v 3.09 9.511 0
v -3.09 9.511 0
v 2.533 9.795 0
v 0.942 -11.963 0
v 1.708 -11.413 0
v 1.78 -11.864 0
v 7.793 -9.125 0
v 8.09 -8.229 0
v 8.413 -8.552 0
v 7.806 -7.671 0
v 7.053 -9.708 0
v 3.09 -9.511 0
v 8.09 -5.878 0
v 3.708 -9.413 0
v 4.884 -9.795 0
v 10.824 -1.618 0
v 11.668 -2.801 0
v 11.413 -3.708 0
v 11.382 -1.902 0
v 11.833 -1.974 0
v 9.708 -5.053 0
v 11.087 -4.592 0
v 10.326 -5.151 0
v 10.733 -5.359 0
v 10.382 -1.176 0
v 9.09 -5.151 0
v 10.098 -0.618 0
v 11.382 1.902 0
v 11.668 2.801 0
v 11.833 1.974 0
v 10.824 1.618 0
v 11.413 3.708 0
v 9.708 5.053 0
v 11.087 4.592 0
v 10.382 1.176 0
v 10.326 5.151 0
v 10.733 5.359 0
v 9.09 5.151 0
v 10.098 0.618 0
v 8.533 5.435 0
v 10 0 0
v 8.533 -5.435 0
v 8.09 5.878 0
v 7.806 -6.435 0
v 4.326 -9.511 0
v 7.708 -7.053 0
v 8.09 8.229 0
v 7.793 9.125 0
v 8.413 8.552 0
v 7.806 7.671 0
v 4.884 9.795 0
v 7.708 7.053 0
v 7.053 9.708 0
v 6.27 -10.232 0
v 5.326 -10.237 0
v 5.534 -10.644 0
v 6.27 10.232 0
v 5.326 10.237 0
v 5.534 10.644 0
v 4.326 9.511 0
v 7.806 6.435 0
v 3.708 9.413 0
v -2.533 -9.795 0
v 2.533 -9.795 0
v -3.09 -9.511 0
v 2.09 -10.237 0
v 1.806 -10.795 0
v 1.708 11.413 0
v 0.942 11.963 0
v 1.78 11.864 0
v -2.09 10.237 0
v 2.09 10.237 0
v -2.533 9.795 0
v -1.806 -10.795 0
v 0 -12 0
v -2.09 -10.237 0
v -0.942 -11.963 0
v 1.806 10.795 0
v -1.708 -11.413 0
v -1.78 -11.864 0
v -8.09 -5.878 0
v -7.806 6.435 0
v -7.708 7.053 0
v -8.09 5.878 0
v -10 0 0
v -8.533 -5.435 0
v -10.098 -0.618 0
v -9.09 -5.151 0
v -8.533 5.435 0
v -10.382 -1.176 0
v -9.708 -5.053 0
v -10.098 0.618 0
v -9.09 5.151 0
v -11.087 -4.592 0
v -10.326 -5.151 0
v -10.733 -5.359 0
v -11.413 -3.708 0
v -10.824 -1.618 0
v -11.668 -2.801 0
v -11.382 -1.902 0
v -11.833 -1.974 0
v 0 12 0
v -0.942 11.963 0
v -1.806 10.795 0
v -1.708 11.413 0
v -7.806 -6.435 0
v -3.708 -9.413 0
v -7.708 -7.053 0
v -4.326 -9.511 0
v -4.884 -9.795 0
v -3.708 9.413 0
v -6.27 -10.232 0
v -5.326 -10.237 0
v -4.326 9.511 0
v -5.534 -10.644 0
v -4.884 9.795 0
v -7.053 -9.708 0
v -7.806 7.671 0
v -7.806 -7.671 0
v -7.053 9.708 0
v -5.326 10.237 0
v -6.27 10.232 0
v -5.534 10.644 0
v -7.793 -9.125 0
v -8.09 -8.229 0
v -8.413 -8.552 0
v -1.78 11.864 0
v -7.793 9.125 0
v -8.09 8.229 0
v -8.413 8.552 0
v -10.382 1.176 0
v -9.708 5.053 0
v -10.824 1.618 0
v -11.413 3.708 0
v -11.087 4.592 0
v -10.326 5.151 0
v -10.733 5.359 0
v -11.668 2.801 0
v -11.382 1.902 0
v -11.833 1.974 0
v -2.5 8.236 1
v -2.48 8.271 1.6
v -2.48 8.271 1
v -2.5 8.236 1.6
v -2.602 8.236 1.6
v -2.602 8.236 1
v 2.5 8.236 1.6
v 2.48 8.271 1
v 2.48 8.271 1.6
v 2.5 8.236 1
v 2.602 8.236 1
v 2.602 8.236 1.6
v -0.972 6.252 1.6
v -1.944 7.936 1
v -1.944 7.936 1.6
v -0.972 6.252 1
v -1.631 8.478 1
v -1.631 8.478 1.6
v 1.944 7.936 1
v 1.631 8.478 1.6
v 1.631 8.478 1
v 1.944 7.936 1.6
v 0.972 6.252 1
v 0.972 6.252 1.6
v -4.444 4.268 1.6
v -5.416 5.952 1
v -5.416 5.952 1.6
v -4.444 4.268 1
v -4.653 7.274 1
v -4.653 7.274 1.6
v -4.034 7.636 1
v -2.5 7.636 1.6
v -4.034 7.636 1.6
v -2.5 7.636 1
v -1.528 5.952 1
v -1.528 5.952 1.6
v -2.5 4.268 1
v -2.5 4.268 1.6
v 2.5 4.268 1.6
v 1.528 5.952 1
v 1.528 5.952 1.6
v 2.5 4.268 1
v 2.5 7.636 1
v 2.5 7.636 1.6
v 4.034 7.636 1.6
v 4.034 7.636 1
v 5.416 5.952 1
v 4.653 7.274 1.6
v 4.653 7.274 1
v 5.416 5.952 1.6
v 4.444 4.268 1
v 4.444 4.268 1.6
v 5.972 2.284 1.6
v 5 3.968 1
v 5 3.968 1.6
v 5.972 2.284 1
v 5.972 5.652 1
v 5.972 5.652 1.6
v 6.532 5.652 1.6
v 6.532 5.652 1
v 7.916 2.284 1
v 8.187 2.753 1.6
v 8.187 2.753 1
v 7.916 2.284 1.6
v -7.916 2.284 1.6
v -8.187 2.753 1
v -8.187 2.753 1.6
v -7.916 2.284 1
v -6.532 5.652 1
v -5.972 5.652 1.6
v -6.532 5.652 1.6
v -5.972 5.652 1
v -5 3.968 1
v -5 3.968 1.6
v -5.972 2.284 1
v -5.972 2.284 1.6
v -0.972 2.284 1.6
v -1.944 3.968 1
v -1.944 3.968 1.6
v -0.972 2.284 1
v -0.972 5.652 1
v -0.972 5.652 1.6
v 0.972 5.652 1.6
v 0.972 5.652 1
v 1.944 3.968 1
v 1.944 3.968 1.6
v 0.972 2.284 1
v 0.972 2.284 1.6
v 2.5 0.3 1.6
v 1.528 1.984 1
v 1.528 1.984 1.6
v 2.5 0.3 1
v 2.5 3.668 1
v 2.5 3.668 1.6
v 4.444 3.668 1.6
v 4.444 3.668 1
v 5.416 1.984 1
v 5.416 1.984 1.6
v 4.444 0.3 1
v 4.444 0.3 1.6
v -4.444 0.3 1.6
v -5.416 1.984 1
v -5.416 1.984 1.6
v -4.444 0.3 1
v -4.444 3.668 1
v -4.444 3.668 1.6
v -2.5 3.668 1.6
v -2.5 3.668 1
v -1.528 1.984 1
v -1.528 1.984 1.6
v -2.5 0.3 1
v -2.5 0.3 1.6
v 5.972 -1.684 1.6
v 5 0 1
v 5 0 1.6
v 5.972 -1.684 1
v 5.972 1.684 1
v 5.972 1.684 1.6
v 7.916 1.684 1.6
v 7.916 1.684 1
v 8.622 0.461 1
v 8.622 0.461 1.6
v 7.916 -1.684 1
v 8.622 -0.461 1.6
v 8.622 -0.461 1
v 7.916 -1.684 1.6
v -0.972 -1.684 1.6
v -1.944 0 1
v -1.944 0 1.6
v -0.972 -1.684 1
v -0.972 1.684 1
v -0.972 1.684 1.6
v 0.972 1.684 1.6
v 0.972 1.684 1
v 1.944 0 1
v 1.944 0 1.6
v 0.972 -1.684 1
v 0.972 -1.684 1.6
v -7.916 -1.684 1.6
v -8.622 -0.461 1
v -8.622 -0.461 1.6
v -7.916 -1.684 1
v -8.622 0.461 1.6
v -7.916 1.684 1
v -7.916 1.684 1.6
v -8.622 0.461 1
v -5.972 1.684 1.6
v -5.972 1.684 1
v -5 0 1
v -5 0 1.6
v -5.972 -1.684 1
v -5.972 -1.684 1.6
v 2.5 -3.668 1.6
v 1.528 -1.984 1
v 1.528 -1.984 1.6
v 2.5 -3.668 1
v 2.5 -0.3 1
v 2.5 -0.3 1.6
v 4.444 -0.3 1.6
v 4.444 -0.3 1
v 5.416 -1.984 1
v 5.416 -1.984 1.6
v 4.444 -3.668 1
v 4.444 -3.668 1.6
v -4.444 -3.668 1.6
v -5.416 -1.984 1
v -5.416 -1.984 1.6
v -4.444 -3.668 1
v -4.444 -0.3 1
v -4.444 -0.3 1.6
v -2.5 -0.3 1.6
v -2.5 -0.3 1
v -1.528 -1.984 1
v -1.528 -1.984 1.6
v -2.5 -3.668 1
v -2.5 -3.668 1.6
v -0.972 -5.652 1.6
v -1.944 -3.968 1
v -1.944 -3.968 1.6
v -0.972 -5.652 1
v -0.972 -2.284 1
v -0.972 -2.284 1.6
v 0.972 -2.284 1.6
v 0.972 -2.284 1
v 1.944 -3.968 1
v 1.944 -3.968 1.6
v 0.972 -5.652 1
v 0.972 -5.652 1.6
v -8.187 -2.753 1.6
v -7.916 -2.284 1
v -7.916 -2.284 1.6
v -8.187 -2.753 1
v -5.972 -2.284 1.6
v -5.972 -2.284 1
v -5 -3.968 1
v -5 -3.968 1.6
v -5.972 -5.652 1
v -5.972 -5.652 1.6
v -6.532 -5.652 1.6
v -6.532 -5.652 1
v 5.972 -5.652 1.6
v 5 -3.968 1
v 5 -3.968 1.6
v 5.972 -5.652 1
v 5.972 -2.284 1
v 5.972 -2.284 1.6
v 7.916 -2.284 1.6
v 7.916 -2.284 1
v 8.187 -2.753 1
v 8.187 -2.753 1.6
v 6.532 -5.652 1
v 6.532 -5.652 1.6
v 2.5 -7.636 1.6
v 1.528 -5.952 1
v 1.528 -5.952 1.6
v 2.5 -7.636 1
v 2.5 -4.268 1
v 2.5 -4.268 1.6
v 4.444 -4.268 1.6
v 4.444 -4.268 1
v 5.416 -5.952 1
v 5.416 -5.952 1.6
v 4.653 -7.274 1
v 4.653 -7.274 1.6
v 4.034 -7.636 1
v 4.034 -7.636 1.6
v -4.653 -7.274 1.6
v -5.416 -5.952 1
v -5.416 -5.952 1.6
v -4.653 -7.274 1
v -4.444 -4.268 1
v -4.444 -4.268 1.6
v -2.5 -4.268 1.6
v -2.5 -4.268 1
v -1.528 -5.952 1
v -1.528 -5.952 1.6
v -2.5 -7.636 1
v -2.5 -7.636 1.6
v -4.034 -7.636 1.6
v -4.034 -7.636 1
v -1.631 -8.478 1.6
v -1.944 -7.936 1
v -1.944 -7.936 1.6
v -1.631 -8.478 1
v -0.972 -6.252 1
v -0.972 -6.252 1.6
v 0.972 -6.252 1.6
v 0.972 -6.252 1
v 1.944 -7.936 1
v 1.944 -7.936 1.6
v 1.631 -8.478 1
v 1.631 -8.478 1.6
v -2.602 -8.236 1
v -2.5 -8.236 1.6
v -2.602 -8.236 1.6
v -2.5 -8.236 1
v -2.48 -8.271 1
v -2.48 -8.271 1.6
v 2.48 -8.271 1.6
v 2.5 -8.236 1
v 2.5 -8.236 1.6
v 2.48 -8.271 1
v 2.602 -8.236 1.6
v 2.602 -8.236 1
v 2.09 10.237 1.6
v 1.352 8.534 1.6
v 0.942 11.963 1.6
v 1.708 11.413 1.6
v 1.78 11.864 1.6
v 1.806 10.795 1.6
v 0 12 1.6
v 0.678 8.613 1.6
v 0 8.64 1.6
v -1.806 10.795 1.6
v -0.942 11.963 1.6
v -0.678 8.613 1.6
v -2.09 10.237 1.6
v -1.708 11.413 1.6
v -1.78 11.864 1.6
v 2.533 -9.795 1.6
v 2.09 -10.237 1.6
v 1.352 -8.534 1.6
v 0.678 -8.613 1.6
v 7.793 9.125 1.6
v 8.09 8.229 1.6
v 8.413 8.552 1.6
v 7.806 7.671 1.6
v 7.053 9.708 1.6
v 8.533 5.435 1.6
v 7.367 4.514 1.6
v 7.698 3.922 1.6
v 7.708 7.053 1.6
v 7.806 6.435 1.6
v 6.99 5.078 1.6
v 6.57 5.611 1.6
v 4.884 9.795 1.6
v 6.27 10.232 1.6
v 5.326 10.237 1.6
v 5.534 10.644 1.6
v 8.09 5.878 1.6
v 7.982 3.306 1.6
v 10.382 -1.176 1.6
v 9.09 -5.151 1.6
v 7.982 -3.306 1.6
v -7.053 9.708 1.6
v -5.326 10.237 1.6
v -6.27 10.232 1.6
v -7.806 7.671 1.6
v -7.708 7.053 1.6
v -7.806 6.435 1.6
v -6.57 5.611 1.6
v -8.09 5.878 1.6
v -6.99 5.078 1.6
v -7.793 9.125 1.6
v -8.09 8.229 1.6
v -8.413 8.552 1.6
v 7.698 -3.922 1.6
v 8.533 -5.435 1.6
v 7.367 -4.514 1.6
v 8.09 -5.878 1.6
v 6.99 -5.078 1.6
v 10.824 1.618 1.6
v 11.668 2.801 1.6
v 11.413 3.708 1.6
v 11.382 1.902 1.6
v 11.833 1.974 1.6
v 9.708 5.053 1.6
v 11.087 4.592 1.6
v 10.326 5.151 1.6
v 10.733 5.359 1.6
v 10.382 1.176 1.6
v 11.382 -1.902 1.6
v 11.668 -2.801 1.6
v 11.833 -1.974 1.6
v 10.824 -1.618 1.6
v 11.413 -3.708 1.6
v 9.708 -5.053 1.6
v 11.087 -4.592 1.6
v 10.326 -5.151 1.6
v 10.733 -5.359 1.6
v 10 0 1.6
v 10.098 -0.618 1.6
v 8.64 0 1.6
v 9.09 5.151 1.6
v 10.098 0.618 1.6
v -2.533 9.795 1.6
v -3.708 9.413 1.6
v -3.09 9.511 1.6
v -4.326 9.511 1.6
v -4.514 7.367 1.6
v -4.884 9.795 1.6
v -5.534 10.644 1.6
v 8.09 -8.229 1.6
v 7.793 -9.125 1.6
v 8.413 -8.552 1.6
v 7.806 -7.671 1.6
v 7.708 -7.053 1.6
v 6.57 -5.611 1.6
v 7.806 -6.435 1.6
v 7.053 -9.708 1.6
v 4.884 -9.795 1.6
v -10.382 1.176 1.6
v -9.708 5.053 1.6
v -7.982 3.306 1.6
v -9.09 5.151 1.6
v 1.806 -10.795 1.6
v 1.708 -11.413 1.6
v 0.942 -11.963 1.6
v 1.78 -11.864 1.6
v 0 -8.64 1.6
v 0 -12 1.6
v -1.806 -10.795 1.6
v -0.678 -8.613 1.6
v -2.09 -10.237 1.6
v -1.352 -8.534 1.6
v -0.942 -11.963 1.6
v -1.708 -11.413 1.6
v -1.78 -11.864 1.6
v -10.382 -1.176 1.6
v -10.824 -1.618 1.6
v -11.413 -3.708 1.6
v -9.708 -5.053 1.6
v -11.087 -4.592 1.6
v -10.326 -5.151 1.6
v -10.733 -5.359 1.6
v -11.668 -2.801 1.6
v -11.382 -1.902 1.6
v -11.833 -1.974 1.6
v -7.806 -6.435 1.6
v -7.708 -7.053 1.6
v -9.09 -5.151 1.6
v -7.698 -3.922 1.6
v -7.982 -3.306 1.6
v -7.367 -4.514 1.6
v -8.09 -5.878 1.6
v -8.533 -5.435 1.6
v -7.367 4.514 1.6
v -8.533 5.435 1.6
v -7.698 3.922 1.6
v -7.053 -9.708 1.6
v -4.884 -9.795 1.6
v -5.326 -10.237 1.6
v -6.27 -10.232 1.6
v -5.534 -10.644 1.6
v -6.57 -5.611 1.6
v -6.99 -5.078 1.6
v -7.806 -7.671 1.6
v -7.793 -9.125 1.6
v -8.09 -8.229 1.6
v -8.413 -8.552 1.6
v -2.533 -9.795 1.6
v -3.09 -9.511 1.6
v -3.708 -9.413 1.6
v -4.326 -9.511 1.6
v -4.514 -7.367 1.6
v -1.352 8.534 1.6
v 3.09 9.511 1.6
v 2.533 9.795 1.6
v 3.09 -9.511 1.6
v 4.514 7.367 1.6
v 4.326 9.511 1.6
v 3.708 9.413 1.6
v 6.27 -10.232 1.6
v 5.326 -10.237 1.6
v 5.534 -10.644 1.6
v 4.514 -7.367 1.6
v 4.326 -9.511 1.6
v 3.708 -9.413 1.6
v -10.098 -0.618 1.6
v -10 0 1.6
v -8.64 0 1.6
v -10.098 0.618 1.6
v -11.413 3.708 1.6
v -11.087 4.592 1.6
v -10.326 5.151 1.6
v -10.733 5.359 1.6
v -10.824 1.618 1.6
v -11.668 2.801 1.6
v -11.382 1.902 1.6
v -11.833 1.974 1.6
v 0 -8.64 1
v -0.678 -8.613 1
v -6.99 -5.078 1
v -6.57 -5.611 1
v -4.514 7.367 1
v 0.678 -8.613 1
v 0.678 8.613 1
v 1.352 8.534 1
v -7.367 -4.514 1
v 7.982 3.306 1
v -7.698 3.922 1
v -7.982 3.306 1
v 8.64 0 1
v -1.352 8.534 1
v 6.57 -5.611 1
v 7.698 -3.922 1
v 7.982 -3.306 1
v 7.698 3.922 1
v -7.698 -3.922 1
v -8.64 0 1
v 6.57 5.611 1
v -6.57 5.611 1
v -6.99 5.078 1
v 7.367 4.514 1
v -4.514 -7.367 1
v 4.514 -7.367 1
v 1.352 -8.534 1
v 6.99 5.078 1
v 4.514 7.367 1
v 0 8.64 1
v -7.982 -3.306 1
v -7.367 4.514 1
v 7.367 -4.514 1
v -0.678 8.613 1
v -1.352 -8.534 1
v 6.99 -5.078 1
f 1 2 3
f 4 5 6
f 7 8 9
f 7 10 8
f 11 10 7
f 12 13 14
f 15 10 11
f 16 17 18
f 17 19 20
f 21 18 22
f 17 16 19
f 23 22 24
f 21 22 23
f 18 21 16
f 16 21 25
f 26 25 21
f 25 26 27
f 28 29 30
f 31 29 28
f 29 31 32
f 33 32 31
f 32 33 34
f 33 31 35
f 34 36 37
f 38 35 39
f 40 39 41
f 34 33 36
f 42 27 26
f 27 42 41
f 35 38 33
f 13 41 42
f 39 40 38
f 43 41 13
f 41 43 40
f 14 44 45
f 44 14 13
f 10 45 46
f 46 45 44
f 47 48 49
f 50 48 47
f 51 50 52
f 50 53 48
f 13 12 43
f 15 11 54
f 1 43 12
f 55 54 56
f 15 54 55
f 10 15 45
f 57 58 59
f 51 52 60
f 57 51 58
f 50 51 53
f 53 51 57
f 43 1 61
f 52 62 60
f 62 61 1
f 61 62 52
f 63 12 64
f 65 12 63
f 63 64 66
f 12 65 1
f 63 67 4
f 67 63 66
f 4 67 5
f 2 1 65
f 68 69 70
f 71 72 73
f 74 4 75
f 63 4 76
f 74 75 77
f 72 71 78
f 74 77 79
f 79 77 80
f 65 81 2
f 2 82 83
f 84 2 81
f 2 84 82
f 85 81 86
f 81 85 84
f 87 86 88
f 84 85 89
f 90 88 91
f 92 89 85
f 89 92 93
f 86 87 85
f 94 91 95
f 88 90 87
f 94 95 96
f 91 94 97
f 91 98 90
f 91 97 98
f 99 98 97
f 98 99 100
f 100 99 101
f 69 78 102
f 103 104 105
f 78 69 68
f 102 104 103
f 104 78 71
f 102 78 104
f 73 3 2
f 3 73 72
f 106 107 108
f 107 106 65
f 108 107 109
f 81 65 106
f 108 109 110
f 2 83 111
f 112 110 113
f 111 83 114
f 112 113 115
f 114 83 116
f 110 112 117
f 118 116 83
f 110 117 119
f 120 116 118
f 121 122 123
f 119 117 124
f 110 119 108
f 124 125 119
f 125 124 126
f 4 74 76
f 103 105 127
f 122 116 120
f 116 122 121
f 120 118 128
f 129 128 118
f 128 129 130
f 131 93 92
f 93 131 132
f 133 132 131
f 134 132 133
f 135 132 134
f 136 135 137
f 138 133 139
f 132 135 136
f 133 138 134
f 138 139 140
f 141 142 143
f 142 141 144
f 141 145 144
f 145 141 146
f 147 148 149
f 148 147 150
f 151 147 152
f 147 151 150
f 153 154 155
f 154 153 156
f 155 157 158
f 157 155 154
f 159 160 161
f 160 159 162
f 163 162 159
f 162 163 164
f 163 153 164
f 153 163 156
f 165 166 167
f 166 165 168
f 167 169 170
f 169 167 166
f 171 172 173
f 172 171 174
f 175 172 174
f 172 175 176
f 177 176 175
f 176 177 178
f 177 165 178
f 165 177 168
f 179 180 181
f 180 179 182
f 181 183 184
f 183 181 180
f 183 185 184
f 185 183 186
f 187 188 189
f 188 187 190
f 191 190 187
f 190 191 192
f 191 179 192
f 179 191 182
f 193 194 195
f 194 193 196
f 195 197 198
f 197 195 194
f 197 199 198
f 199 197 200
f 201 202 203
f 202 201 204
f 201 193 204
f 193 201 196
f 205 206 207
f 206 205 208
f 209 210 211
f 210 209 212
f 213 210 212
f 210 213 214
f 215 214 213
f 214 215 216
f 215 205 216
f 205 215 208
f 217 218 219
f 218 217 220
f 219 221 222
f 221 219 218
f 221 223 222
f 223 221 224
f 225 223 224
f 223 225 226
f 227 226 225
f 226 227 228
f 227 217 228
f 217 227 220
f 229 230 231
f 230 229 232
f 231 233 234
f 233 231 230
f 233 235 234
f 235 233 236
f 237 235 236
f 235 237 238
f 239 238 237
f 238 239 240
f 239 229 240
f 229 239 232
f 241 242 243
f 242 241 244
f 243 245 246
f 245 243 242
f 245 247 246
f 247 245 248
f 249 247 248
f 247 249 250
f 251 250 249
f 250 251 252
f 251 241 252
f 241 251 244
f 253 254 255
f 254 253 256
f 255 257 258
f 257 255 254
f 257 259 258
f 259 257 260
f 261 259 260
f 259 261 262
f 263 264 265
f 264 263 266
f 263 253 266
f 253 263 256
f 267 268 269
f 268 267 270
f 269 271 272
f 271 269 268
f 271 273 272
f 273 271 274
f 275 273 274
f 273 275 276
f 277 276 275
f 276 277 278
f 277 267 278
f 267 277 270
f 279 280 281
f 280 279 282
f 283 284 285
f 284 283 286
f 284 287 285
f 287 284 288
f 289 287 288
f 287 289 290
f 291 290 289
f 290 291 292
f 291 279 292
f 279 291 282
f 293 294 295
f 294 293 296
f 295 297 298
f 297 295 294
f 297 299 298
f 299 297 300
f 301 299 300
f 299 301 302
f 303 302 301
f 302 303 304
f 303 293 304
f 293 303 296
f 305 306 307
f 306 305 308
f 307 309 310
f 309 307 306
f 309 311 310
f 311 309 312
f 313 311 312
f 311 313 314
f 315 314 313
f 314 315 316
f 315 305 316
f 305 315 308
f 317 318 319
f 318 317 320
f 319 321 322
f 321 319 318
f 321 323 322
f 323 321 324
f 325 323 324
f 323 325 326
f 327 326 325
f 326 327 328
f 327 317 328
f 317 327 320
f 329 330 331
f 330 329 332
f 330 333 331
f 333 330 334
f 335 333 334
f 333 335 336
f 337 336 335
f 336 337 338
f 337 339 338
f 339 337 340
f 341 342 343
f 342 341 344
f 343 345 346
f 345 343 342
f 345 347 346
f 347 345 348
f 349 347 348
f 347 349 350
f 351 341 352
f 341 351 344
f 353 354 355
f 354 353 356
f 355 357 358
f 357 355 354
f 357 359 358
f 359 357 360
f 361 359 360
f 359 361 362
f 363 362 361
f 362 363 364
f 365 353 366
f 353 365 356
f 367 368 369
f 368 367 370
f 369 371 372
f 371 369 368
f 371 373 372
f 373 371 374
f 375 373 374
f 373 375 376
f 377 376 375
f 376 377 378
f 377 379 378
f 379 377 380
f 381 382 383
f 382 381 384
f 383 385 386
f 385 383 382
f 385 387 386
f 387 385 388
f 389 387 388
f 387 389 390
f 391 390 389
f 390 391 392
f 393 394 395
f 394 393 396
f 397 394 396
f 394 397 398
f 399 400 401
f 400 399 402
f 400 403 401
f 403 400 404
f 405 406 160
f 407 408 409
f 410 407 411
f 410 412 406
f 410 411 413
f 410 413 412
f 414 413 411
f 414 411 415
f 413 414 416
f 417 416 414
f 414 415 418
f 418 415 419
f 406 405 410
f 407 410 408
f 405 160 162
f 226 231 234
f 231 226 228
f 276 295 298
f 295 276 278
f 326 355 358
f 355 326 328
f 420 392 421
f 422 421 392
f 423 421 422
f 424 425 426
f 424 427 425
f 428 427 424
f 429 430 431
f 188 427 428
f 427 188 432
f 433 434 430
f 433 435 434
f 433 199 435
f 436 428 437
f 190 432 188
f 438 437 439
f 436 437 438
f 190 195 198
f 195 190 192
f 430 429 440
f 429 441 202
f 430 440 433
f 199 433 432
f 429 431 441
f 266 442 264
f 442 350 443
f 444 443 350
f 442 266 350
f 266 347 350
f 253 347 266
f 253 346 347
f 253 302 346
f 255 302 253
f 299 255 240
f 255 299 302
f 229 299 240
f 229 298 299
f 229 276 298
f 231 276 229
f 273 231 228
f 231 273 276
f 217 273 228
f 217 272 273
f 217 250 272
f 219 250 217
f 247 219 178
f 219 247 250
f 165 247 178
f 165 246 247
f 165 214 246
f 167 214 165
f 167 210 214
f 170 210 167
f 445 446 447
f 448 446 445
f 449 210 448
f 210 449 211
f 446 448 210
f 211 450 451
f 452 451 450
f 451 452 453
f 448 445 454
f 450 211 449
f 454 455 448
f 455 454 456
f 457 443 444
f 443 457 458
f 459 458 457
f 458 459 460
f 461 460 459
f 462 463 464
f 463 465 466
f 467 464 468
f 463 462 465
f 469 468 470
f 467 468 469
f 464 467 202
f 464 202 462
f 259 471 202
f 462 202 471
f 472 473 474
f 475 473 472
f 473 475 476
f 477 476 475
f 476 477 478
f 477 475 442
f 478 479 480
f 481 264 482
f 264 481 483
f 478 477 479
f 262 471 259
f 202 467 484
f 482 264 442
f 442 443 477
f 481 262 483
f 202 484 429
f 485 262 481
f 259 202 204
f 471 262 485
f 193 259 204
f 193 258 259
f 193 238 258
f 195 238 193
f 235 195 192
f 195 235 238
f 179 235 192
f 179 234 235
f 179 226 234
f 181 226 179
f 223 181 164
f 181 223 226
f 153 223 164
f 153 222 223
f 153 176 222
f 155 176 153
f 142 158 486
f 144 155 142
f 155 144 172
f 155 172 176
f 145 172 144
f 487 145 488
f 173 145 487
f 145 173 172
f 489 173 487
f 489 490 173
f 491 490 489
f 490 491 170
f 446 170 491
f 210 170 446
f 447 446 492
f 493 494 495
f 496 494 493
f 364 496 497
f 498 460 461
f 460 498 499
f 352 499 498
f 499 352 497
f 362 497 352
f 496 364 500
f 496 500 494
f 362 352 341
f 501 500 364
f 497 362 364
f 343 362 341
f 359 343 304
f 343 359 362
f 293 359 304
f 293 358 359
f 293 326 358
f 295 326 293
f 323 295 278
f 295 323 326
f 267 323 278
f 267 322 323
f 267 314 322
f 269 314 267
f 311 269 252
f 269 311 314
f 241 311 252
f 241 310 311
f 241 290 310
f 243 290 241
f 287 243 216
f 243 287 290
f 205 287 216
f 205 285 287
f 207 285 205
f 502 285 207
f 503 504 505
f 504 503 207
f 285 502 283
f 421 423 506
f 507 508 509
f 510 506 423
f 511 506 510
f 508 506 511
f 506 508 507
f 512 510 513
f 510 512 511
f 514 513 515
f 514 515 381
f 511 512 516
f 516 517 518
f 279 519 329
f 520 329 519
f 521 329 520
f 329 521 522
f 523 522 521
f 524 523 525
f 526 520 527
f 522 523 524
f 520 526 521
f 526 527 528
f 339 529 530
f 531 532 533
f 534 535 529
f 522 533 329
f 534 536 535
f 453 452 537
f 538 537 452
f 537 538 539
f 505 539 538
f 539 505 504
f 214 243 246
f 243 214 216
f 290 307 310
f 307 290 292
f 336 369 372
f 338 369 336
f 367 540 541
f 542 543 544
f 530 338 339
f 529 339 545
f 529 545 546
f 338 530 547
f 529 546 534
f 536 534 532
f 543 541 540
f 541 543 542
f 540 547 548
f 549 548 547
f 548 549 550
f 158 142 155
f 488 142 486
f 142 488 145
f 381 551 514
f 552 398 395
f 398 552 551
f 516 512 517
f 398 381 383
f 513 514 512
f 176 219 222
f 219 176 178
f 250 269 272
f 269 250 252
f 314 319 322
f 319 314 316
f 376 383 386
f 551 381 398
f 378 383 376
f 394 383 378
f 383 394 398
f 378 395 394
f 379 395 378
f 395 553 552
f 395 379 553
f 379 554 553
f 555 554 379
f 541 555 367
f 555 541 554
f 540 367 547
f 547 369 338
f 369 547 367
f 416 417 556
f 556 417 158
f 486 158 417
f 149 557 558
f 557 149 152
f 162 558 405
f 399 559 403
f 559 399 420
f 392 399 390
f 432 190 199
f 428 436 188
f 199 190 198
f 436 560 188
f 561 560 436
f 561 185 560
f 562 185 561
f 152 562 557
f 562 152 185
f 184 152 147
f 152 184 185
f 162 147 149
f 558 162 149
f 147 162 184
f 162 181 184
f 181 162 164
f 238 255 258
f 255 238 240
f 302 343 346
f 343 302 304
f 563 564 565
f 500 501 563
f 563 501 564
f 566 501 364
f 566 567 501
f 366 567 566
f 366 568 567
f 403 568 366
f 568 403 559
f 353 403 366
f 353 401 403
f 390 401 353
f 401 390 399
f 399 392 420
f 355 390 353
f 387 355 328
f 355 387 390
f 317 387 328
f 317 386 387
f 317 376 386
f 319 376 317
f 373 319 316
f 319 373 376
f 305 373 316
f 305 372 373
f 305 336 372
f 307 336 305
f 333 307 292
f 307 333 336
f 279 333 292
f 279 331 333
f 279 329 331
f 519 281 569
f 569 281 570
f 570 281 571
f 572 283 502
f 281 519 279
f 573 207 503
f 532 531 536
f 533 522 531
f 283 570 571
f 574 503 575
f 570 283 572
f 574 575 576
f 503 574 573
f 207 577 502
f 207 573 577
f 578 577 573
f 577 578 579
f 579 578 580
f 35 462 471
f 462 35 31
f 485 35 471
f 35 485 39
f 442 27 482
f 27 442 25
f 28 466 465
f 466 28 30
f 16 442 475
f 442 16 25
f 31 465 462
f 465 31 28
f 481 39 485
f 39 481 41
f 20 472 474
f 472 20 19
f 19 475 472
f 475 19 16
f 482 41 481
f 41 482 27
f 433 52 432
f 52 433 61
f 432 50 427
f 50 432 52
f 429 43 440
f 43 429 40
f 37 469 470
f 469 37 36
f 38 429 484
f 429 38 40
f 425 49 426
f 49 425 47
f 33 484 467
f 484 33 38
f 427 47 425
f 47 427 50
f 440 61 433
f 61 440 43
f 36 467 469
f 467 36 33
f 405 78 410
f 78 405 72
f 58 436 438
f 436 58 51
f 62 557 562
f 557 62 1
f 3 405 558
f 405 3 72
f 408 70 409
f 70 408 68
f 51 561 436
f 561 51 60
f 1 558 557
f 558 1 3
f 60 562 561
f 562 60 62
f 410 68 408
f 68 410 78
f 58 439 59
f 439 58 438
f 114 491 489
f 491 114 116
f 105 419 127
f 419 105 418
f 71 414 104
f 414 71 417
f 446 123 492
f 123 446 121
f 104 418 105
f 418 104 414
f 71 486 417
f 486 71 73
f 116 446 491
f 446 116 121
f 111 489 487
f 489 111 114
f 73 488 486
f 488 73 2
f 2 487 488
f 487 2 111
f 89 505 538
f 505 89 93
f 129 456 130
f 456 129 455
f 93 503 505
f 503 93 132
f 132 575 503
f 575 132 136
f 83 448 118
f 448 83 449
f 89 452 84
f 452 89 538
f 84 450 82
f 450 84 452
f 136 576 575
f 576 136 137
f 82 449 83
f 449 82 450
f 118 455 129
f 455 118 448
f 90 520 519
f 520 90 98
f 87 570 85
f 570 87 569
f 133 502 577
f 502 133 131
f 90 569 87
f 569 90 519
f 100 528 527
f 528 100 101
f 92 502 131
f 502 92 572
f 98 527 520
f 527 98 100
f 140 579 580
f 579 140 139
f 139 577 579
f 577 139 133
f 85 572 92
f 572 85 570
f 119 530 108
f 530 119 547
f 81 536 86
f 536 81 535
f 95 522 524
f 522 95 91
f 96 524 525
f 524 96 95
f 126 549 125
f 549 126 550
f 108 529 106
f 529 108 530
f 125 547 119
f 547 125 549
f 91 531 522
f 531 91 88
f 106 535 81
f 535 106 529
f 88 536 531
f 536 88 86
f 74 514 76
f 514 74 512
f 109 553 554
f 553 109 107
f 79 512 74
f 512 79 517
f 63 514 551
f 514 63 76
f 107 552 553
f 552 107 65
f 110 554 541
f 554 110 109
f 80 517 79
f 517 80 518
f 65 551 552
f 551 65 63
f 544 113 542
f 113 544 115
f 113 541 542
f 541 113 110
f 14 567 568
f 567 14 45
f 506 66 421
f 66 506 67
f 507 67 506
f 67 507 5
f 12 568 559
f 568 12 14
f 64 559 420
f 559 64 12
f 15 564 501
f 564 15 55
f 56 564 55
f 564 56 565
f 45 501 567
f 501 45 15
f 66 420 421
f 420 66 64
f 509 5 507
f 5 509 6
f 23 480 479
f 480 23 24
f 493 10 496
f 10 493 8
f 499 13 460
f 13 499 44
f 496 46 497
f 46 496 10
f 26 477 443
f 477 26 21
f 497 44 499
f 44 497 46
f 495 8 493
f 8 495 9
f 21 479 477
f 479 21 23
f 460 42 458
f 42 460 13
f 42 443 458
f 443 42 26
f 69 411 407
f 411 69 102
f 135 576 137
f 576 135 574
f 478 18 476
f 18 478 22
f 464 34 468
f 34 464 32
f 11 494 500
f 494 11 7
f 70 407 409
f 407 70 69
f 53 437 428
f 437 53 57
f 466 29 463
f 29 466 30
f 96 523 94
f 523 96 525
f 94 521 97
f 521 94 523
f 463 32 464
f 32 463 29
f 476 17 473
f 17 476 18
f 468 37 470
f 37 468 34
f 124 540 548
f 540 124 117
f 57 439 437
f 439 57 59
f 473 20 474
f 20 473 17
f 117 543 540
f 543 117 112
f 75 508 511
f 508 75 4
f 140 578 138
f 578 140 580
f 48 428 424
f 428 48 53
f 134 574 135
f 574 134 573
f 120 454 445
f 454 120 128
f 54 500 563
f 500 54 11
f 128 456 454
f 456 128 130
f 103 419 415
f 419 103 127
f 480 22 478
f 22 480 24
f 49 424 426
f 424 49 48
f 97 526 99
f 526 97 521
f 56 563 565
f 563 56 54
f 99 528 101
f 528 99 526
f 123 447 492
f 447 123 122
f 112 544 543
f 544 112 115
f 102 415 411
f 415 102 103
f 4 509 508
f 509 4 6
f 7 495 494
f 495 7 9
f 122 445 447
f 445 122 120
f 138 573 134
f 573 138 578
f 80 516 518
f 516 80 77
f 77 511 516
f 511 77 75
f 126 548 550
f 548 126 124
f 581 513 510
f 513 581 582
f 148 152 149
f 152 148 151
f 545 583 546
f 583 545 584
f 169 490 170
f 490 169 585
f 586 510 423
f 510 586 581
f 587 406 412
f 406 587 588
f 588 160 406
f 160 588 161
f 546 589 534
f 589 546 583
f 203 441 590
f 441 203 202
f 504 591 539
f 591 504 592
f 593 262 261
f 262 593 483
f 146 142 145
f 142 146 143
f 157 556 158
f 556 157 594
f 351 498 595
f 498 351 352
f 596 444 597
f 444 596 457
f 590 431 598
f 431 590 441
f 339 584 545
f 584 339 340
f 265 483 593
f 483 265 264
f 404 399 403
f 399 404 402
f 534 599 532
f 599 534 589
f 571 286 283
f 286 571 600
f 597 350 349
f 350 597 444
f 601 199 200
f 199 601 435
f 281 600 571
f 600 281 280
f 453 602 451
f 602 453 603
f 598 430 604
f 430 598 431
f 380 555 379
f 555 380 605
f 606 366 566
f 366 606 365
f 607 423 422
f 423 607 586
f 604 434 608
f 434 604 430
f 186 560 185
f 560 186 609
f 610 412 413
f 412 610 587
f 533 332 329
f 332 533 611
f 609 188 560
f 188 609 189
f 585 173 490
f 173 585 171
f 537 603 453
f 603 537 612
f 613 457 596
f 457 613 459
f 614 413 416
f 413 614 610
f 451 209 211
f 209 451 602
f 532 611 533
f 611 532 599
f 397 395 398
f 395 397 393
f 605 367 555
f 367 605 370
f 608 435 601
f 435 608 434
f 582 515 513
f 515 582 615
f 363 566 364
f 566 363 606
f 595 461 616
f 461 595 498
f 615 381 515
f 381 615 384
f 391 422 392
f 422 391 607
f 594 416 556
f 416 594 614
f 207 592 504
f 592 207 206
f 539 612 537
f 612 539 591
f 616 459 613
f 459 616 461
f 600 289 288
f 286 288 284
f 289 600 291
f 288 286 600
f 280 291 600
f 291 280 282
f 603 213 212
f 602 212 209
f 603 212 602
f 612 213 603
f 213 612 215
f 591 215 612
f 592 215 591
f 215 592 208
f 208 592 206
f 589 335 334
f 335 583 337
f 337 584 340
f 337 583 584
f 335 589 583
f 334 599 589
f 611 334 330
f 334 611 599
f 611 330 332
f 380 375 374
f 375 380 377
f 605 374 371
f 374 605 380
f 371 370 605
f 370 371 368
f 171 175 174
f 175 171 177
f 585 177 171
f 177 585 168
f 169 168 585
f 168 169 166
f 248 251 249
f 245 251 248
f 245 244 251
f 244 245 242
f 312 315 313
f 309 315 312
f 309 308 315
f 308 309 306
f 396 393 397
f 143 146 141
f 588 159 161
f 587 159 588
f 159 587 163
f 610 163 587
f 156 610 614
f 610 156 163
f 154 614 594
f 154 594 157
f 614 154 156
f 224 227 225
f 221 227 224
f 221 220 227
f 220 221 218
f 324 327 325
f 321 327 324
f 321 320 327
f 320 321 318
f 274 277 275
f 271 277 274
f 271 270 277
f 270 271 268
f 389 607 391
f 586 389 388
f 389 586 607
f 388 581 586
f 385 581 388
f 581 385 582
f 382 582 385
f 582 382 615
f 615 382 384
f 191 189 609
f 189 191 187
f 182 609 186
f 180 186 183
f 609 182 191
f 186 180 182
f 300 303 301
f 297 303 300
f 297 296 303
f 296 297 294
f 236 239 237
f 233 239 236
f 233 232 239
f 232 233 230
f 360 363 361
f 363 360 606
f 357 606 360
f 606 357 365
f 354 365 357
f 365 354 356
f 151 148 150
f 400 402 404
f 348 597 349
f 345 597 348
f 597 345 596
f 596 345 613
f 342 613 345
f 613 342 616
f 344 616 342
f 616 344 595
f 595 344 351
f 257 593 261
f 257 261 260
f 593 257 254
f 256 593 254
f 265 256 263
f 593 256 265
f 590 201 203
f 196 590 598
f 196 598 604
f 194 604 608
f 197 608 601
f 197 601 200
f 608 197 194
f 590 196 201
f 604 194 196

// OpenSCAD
// file: hexagonal_grid.scad
// See https://gist.github.com/lorennorman/1534990

module hexagon(radius)
{
  circle(r=radius,$fn=6);
}
 
module shell(radius)
{
  difference()
  {
    hexagon(radius*1.2); // base
    scale([1, 1, 1.1]) hexagon(radius*0.98); // hole, rad was * 0.85
  }
}
 
module piece(radius)
{
  translate([0, 0, -radius/12])
  {
    scale([1,1,0.5])
    {
      hexagon(radius);
    }
  }
}
 
module shell_with_piece(radius)
{
  shell(radius);
  piece(radius);
}
 
function column_to_offset(column, offset) = (column % 2) * offset;
 
module translate_to_hex(x_coord, y_coord, hex_width)
{
  translate([x_coord*hex_width*1.75, y_coord*hex_width*2+column_to_offset(x_coord, hex_width), 0])
  {
    children(0);
  }
}
 
module lattice(rows, columns, hex_width)
{
  for(x = [0:columns-1])
  {
    for(y = [0:rows-1])
    {
      translate_to_hex(x, y, hex_width)
      {
        shell(hex_width);
      }
    }
  }
}
 
linear_extrude(height=4)
{
  lattice(4, 5, 8);
 
  // translate_to_hex(2, 2, 4)
  // {
  //   piece(4);
  // }
}
// main file
// Modified to simplify design somewhat (removed domed top) -- RBR 2/5/2015

use <hexagonal_grid.scad>;

hexWidth = 2.0; // mm

module shield() {

union() scale([0.8, 0.8, 0.4]) {

	intersection() {
		union() {
			scale(1.24) translate([-14, -20, 0]) {
				linear_extrude(height = 20)
				   lattice(10, 10, hexWidth);
			}
		}
		translate([0, 0, -1]) cylinder(r = 12, h = 5);
		// translate([0, 0, -1]) cylinder(r = 12, h = 50);
		// translate([0, 0, 1.5]) scale([1, 1, 0.35]) sphere(11);
	}

	difference() {
		cylinder(h = 4, r = 15, $fn = 80);
		translate([0, 0, -0.5]) cylinder(h = 5, r = 10.8, $fn = 80);
		//translate([0, 0, -0.5]) cylinder(h = 5, r = 11, $fn = 80);
		for(i = [0:9]) {
			rotate([0, 0, 36 * i]) translate([15, 0, -10]) {
				cylinder(h = 50, r = 2.5, $fn = 20);
			}
		}
	}

	union() {
		difference() {
			cylinder(h = 2.5, r = 12);
			// cylinder(h = 3, r = 12);
			//translate([0, 0, 3]) scale([1, 1, 0.165]) sphere(11);
		}
		cylinder(h = 0.7/0.6, r = 12);
	}

}

}

shield();

// cube(10, 10, 10);
